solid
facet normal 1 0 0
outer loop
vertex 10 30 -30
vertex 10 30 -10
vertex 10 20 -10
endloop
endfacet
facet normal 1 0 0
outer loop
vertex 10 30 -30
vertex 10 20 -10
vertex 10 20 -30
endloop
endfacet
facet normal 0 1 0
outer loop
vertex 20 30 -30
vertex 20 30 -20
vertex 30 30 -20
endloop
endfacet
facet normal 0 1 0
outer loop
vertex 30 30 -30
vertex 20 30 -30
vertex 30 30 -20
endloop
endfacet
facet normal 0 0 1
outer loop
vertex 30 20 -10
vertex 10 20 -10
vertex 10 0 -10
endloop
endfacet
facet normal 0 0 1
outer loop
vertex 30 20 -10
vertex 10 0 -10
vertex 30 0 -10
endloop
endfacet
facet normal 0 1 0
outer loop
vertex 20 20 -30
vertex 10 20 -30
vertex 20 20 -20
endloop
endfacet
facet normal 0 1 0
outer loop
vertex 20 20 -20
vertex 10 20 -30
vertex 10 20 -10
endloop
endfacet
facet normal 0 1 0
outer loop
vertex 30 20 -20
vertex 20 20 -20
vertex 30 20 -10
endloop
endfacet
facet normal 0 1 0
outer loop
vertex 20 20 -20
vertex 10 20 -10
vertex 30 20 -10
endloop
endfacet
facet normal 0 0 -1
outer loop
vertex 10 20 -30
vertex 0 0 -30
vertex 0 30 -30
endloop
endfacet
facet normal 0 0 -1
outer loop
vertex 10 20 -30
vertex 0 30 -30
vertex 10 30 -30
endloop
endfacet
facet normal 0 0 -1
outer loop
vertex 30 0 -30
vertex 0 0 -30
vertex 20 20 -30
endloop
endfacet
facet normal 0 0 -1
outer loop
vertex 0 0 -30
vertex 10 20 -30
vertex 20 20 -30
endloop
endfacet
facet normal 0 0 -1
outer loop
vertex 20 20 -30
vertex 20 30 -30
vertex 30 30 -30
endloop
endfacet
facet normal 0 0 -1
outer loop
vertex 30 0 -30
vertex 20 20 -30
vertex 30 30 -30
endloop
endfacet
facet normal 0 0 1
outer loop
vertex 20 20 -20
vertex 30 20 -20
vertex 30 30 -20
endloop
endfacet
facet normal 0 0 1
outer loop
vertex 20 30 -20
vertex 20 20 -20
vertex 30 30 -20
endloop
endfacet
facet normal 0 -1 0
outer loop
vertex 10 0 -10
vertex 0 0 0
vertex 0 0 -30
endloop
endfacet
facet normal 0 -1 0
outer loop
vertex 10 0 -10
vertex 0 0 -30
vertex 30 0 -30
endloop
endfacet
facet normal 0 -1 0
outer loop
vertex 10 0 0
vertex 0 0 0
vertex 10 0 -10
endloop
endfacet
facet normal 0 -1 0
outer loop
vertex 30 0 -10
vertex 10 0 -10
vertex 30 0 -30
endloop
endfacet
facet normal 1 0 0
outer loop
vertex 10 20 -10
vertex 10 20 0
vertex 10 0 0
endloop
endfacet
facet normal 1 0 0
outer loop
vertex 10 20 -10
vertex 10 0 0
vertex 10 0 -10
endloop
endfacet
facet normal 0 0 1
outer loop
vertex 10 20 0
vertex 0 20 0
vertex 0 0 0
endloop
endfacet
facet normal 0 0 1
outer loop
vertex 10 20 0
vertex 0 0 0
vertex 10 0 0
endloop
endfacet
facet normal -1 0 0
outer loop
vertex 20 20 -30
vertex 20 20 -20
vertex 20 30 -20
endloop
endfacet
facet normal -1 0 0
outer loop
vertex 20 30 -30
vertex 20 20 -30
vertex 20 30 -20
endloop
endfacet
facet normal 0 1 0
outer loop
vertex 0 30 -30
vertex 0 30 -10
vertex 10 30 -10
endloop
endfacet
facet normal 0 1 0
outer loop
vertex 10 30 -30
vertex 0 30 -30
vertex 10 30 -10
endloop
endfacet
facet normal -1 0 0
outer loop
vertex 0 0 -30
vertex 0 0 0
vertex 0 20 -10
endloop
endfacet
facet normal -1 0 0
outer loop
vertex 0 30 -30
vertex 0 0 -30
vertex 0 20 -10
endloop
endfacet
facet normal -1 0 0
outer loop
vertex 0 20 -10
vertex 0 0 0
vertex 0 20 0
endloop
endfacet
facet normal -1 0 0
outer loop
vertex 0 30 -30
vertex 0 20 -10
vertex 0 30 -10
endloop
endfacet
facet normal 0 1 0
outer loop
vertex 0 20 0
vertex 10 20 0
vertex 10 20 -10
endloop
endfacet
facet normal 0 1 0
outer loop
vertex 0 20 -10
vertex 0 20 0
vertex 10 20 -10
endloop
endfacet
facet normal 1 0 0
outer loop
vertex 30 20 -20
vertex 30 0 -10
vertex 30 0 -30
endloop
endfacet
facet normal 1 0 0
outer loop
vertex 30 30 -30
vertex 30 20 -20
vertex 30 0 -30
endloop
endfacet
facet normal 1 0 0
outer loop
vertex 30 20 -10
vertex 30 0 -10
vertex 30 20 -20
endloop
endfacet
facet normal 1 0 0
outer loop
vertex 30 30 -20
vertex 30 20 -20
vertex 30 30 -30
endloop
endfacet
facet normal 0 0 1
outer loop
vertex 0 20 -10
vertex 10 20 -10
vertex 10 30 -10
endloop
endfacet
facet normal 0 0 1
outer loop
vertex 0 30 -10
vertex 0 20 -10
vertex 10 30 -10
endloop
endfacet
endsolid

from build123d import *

# Parameters (mm, degrees)
SKETCH_1_W          = 30
SKETCH_1_H          = 30
EXTRUDE_1_DEPTH     = 30
SKETCH_5_W          = 10
SKETCH_5_H          = 10
CUT_EXTRUDE_4_DEPTH = 52.961524227
SKETCH_7_W          = 20
SKETCH_7_H          = 10
CUT_EXTRUDE_5_DEPTH = 52.961524227
SKETCH_9_W          = 10
SKETCH_9_H          = 10
CUT_EXTRUDE_6_DEPTH = 52.961524227
SKETCH_10_W         = 10
SKETCH_10_H         = 10
CUT_EXTRUDE_7_DEPTH = 15


with BuildPart() as part:
    # 草圖1 → 填料-伸1 (new body)
    with BuildSketch(Plane.XY):
        with Locations((15, 15)):
            Rectangle(SKETCH_1_W, SKETCH_1_H)
    extrude(amount=-EXTRUDE_1_DEPTH)

    # 草圖5 → 除料-伸長4 (cut, through all)
    with BuildSketch(Plane.XY):
        with Locations((15, 25)):
            Rectangle(SKETCH_5_W, SKETCH_5_H)
    extrude(amount=-CUT_EXTRUDE_4_DEPTH, mode=Mode.SUBTRACT)

    # 草圖7 → 除料-伸長5 (cut, through all)
    with BuildSketch(Plane(origin=(0, 30, 0), x_dir=(1, 0, 0), z_dir=(0, 1, 0))):
        with Locations((20, 5)):
            Rectangle(SKETCH_7_W, SKETCH_7_H)
    extrude(amount=-CUT_EXTRUDE_5_DEPTH, mode=Mode.SUBTRACT)

    # 草圖9 → 除料-伸長6 (cut, through all)
    with BuildSketch(Plane(origin=(30, 0, 0), x_dir=(0, 0, -1), z_dir=(1, 0, 0))):
        with Locations((5, 25)):
            Rectangle(SKETCH_9_W, SKETCH_9_H)
    extrude(amount=-CUT_EXTRUDE_6_DEPTH, mode=Mode.SUBTRACT)

    # 草圖10 → 除料-伸長7 (cut)
    with BuildSketch(Plane(origin=(30, 0, 0), x_dir=(0, 0, -1), z_dir=(1, 0, 0))):
        with Locations((15, 25)):
            Rectangle(SKETCH_10_W, SKETCH_10_H)
    extrude(amount=-CUT_EXTRUDE_7_DEPTH, mode=Mode.SUBTRACT)


solid = part.part
